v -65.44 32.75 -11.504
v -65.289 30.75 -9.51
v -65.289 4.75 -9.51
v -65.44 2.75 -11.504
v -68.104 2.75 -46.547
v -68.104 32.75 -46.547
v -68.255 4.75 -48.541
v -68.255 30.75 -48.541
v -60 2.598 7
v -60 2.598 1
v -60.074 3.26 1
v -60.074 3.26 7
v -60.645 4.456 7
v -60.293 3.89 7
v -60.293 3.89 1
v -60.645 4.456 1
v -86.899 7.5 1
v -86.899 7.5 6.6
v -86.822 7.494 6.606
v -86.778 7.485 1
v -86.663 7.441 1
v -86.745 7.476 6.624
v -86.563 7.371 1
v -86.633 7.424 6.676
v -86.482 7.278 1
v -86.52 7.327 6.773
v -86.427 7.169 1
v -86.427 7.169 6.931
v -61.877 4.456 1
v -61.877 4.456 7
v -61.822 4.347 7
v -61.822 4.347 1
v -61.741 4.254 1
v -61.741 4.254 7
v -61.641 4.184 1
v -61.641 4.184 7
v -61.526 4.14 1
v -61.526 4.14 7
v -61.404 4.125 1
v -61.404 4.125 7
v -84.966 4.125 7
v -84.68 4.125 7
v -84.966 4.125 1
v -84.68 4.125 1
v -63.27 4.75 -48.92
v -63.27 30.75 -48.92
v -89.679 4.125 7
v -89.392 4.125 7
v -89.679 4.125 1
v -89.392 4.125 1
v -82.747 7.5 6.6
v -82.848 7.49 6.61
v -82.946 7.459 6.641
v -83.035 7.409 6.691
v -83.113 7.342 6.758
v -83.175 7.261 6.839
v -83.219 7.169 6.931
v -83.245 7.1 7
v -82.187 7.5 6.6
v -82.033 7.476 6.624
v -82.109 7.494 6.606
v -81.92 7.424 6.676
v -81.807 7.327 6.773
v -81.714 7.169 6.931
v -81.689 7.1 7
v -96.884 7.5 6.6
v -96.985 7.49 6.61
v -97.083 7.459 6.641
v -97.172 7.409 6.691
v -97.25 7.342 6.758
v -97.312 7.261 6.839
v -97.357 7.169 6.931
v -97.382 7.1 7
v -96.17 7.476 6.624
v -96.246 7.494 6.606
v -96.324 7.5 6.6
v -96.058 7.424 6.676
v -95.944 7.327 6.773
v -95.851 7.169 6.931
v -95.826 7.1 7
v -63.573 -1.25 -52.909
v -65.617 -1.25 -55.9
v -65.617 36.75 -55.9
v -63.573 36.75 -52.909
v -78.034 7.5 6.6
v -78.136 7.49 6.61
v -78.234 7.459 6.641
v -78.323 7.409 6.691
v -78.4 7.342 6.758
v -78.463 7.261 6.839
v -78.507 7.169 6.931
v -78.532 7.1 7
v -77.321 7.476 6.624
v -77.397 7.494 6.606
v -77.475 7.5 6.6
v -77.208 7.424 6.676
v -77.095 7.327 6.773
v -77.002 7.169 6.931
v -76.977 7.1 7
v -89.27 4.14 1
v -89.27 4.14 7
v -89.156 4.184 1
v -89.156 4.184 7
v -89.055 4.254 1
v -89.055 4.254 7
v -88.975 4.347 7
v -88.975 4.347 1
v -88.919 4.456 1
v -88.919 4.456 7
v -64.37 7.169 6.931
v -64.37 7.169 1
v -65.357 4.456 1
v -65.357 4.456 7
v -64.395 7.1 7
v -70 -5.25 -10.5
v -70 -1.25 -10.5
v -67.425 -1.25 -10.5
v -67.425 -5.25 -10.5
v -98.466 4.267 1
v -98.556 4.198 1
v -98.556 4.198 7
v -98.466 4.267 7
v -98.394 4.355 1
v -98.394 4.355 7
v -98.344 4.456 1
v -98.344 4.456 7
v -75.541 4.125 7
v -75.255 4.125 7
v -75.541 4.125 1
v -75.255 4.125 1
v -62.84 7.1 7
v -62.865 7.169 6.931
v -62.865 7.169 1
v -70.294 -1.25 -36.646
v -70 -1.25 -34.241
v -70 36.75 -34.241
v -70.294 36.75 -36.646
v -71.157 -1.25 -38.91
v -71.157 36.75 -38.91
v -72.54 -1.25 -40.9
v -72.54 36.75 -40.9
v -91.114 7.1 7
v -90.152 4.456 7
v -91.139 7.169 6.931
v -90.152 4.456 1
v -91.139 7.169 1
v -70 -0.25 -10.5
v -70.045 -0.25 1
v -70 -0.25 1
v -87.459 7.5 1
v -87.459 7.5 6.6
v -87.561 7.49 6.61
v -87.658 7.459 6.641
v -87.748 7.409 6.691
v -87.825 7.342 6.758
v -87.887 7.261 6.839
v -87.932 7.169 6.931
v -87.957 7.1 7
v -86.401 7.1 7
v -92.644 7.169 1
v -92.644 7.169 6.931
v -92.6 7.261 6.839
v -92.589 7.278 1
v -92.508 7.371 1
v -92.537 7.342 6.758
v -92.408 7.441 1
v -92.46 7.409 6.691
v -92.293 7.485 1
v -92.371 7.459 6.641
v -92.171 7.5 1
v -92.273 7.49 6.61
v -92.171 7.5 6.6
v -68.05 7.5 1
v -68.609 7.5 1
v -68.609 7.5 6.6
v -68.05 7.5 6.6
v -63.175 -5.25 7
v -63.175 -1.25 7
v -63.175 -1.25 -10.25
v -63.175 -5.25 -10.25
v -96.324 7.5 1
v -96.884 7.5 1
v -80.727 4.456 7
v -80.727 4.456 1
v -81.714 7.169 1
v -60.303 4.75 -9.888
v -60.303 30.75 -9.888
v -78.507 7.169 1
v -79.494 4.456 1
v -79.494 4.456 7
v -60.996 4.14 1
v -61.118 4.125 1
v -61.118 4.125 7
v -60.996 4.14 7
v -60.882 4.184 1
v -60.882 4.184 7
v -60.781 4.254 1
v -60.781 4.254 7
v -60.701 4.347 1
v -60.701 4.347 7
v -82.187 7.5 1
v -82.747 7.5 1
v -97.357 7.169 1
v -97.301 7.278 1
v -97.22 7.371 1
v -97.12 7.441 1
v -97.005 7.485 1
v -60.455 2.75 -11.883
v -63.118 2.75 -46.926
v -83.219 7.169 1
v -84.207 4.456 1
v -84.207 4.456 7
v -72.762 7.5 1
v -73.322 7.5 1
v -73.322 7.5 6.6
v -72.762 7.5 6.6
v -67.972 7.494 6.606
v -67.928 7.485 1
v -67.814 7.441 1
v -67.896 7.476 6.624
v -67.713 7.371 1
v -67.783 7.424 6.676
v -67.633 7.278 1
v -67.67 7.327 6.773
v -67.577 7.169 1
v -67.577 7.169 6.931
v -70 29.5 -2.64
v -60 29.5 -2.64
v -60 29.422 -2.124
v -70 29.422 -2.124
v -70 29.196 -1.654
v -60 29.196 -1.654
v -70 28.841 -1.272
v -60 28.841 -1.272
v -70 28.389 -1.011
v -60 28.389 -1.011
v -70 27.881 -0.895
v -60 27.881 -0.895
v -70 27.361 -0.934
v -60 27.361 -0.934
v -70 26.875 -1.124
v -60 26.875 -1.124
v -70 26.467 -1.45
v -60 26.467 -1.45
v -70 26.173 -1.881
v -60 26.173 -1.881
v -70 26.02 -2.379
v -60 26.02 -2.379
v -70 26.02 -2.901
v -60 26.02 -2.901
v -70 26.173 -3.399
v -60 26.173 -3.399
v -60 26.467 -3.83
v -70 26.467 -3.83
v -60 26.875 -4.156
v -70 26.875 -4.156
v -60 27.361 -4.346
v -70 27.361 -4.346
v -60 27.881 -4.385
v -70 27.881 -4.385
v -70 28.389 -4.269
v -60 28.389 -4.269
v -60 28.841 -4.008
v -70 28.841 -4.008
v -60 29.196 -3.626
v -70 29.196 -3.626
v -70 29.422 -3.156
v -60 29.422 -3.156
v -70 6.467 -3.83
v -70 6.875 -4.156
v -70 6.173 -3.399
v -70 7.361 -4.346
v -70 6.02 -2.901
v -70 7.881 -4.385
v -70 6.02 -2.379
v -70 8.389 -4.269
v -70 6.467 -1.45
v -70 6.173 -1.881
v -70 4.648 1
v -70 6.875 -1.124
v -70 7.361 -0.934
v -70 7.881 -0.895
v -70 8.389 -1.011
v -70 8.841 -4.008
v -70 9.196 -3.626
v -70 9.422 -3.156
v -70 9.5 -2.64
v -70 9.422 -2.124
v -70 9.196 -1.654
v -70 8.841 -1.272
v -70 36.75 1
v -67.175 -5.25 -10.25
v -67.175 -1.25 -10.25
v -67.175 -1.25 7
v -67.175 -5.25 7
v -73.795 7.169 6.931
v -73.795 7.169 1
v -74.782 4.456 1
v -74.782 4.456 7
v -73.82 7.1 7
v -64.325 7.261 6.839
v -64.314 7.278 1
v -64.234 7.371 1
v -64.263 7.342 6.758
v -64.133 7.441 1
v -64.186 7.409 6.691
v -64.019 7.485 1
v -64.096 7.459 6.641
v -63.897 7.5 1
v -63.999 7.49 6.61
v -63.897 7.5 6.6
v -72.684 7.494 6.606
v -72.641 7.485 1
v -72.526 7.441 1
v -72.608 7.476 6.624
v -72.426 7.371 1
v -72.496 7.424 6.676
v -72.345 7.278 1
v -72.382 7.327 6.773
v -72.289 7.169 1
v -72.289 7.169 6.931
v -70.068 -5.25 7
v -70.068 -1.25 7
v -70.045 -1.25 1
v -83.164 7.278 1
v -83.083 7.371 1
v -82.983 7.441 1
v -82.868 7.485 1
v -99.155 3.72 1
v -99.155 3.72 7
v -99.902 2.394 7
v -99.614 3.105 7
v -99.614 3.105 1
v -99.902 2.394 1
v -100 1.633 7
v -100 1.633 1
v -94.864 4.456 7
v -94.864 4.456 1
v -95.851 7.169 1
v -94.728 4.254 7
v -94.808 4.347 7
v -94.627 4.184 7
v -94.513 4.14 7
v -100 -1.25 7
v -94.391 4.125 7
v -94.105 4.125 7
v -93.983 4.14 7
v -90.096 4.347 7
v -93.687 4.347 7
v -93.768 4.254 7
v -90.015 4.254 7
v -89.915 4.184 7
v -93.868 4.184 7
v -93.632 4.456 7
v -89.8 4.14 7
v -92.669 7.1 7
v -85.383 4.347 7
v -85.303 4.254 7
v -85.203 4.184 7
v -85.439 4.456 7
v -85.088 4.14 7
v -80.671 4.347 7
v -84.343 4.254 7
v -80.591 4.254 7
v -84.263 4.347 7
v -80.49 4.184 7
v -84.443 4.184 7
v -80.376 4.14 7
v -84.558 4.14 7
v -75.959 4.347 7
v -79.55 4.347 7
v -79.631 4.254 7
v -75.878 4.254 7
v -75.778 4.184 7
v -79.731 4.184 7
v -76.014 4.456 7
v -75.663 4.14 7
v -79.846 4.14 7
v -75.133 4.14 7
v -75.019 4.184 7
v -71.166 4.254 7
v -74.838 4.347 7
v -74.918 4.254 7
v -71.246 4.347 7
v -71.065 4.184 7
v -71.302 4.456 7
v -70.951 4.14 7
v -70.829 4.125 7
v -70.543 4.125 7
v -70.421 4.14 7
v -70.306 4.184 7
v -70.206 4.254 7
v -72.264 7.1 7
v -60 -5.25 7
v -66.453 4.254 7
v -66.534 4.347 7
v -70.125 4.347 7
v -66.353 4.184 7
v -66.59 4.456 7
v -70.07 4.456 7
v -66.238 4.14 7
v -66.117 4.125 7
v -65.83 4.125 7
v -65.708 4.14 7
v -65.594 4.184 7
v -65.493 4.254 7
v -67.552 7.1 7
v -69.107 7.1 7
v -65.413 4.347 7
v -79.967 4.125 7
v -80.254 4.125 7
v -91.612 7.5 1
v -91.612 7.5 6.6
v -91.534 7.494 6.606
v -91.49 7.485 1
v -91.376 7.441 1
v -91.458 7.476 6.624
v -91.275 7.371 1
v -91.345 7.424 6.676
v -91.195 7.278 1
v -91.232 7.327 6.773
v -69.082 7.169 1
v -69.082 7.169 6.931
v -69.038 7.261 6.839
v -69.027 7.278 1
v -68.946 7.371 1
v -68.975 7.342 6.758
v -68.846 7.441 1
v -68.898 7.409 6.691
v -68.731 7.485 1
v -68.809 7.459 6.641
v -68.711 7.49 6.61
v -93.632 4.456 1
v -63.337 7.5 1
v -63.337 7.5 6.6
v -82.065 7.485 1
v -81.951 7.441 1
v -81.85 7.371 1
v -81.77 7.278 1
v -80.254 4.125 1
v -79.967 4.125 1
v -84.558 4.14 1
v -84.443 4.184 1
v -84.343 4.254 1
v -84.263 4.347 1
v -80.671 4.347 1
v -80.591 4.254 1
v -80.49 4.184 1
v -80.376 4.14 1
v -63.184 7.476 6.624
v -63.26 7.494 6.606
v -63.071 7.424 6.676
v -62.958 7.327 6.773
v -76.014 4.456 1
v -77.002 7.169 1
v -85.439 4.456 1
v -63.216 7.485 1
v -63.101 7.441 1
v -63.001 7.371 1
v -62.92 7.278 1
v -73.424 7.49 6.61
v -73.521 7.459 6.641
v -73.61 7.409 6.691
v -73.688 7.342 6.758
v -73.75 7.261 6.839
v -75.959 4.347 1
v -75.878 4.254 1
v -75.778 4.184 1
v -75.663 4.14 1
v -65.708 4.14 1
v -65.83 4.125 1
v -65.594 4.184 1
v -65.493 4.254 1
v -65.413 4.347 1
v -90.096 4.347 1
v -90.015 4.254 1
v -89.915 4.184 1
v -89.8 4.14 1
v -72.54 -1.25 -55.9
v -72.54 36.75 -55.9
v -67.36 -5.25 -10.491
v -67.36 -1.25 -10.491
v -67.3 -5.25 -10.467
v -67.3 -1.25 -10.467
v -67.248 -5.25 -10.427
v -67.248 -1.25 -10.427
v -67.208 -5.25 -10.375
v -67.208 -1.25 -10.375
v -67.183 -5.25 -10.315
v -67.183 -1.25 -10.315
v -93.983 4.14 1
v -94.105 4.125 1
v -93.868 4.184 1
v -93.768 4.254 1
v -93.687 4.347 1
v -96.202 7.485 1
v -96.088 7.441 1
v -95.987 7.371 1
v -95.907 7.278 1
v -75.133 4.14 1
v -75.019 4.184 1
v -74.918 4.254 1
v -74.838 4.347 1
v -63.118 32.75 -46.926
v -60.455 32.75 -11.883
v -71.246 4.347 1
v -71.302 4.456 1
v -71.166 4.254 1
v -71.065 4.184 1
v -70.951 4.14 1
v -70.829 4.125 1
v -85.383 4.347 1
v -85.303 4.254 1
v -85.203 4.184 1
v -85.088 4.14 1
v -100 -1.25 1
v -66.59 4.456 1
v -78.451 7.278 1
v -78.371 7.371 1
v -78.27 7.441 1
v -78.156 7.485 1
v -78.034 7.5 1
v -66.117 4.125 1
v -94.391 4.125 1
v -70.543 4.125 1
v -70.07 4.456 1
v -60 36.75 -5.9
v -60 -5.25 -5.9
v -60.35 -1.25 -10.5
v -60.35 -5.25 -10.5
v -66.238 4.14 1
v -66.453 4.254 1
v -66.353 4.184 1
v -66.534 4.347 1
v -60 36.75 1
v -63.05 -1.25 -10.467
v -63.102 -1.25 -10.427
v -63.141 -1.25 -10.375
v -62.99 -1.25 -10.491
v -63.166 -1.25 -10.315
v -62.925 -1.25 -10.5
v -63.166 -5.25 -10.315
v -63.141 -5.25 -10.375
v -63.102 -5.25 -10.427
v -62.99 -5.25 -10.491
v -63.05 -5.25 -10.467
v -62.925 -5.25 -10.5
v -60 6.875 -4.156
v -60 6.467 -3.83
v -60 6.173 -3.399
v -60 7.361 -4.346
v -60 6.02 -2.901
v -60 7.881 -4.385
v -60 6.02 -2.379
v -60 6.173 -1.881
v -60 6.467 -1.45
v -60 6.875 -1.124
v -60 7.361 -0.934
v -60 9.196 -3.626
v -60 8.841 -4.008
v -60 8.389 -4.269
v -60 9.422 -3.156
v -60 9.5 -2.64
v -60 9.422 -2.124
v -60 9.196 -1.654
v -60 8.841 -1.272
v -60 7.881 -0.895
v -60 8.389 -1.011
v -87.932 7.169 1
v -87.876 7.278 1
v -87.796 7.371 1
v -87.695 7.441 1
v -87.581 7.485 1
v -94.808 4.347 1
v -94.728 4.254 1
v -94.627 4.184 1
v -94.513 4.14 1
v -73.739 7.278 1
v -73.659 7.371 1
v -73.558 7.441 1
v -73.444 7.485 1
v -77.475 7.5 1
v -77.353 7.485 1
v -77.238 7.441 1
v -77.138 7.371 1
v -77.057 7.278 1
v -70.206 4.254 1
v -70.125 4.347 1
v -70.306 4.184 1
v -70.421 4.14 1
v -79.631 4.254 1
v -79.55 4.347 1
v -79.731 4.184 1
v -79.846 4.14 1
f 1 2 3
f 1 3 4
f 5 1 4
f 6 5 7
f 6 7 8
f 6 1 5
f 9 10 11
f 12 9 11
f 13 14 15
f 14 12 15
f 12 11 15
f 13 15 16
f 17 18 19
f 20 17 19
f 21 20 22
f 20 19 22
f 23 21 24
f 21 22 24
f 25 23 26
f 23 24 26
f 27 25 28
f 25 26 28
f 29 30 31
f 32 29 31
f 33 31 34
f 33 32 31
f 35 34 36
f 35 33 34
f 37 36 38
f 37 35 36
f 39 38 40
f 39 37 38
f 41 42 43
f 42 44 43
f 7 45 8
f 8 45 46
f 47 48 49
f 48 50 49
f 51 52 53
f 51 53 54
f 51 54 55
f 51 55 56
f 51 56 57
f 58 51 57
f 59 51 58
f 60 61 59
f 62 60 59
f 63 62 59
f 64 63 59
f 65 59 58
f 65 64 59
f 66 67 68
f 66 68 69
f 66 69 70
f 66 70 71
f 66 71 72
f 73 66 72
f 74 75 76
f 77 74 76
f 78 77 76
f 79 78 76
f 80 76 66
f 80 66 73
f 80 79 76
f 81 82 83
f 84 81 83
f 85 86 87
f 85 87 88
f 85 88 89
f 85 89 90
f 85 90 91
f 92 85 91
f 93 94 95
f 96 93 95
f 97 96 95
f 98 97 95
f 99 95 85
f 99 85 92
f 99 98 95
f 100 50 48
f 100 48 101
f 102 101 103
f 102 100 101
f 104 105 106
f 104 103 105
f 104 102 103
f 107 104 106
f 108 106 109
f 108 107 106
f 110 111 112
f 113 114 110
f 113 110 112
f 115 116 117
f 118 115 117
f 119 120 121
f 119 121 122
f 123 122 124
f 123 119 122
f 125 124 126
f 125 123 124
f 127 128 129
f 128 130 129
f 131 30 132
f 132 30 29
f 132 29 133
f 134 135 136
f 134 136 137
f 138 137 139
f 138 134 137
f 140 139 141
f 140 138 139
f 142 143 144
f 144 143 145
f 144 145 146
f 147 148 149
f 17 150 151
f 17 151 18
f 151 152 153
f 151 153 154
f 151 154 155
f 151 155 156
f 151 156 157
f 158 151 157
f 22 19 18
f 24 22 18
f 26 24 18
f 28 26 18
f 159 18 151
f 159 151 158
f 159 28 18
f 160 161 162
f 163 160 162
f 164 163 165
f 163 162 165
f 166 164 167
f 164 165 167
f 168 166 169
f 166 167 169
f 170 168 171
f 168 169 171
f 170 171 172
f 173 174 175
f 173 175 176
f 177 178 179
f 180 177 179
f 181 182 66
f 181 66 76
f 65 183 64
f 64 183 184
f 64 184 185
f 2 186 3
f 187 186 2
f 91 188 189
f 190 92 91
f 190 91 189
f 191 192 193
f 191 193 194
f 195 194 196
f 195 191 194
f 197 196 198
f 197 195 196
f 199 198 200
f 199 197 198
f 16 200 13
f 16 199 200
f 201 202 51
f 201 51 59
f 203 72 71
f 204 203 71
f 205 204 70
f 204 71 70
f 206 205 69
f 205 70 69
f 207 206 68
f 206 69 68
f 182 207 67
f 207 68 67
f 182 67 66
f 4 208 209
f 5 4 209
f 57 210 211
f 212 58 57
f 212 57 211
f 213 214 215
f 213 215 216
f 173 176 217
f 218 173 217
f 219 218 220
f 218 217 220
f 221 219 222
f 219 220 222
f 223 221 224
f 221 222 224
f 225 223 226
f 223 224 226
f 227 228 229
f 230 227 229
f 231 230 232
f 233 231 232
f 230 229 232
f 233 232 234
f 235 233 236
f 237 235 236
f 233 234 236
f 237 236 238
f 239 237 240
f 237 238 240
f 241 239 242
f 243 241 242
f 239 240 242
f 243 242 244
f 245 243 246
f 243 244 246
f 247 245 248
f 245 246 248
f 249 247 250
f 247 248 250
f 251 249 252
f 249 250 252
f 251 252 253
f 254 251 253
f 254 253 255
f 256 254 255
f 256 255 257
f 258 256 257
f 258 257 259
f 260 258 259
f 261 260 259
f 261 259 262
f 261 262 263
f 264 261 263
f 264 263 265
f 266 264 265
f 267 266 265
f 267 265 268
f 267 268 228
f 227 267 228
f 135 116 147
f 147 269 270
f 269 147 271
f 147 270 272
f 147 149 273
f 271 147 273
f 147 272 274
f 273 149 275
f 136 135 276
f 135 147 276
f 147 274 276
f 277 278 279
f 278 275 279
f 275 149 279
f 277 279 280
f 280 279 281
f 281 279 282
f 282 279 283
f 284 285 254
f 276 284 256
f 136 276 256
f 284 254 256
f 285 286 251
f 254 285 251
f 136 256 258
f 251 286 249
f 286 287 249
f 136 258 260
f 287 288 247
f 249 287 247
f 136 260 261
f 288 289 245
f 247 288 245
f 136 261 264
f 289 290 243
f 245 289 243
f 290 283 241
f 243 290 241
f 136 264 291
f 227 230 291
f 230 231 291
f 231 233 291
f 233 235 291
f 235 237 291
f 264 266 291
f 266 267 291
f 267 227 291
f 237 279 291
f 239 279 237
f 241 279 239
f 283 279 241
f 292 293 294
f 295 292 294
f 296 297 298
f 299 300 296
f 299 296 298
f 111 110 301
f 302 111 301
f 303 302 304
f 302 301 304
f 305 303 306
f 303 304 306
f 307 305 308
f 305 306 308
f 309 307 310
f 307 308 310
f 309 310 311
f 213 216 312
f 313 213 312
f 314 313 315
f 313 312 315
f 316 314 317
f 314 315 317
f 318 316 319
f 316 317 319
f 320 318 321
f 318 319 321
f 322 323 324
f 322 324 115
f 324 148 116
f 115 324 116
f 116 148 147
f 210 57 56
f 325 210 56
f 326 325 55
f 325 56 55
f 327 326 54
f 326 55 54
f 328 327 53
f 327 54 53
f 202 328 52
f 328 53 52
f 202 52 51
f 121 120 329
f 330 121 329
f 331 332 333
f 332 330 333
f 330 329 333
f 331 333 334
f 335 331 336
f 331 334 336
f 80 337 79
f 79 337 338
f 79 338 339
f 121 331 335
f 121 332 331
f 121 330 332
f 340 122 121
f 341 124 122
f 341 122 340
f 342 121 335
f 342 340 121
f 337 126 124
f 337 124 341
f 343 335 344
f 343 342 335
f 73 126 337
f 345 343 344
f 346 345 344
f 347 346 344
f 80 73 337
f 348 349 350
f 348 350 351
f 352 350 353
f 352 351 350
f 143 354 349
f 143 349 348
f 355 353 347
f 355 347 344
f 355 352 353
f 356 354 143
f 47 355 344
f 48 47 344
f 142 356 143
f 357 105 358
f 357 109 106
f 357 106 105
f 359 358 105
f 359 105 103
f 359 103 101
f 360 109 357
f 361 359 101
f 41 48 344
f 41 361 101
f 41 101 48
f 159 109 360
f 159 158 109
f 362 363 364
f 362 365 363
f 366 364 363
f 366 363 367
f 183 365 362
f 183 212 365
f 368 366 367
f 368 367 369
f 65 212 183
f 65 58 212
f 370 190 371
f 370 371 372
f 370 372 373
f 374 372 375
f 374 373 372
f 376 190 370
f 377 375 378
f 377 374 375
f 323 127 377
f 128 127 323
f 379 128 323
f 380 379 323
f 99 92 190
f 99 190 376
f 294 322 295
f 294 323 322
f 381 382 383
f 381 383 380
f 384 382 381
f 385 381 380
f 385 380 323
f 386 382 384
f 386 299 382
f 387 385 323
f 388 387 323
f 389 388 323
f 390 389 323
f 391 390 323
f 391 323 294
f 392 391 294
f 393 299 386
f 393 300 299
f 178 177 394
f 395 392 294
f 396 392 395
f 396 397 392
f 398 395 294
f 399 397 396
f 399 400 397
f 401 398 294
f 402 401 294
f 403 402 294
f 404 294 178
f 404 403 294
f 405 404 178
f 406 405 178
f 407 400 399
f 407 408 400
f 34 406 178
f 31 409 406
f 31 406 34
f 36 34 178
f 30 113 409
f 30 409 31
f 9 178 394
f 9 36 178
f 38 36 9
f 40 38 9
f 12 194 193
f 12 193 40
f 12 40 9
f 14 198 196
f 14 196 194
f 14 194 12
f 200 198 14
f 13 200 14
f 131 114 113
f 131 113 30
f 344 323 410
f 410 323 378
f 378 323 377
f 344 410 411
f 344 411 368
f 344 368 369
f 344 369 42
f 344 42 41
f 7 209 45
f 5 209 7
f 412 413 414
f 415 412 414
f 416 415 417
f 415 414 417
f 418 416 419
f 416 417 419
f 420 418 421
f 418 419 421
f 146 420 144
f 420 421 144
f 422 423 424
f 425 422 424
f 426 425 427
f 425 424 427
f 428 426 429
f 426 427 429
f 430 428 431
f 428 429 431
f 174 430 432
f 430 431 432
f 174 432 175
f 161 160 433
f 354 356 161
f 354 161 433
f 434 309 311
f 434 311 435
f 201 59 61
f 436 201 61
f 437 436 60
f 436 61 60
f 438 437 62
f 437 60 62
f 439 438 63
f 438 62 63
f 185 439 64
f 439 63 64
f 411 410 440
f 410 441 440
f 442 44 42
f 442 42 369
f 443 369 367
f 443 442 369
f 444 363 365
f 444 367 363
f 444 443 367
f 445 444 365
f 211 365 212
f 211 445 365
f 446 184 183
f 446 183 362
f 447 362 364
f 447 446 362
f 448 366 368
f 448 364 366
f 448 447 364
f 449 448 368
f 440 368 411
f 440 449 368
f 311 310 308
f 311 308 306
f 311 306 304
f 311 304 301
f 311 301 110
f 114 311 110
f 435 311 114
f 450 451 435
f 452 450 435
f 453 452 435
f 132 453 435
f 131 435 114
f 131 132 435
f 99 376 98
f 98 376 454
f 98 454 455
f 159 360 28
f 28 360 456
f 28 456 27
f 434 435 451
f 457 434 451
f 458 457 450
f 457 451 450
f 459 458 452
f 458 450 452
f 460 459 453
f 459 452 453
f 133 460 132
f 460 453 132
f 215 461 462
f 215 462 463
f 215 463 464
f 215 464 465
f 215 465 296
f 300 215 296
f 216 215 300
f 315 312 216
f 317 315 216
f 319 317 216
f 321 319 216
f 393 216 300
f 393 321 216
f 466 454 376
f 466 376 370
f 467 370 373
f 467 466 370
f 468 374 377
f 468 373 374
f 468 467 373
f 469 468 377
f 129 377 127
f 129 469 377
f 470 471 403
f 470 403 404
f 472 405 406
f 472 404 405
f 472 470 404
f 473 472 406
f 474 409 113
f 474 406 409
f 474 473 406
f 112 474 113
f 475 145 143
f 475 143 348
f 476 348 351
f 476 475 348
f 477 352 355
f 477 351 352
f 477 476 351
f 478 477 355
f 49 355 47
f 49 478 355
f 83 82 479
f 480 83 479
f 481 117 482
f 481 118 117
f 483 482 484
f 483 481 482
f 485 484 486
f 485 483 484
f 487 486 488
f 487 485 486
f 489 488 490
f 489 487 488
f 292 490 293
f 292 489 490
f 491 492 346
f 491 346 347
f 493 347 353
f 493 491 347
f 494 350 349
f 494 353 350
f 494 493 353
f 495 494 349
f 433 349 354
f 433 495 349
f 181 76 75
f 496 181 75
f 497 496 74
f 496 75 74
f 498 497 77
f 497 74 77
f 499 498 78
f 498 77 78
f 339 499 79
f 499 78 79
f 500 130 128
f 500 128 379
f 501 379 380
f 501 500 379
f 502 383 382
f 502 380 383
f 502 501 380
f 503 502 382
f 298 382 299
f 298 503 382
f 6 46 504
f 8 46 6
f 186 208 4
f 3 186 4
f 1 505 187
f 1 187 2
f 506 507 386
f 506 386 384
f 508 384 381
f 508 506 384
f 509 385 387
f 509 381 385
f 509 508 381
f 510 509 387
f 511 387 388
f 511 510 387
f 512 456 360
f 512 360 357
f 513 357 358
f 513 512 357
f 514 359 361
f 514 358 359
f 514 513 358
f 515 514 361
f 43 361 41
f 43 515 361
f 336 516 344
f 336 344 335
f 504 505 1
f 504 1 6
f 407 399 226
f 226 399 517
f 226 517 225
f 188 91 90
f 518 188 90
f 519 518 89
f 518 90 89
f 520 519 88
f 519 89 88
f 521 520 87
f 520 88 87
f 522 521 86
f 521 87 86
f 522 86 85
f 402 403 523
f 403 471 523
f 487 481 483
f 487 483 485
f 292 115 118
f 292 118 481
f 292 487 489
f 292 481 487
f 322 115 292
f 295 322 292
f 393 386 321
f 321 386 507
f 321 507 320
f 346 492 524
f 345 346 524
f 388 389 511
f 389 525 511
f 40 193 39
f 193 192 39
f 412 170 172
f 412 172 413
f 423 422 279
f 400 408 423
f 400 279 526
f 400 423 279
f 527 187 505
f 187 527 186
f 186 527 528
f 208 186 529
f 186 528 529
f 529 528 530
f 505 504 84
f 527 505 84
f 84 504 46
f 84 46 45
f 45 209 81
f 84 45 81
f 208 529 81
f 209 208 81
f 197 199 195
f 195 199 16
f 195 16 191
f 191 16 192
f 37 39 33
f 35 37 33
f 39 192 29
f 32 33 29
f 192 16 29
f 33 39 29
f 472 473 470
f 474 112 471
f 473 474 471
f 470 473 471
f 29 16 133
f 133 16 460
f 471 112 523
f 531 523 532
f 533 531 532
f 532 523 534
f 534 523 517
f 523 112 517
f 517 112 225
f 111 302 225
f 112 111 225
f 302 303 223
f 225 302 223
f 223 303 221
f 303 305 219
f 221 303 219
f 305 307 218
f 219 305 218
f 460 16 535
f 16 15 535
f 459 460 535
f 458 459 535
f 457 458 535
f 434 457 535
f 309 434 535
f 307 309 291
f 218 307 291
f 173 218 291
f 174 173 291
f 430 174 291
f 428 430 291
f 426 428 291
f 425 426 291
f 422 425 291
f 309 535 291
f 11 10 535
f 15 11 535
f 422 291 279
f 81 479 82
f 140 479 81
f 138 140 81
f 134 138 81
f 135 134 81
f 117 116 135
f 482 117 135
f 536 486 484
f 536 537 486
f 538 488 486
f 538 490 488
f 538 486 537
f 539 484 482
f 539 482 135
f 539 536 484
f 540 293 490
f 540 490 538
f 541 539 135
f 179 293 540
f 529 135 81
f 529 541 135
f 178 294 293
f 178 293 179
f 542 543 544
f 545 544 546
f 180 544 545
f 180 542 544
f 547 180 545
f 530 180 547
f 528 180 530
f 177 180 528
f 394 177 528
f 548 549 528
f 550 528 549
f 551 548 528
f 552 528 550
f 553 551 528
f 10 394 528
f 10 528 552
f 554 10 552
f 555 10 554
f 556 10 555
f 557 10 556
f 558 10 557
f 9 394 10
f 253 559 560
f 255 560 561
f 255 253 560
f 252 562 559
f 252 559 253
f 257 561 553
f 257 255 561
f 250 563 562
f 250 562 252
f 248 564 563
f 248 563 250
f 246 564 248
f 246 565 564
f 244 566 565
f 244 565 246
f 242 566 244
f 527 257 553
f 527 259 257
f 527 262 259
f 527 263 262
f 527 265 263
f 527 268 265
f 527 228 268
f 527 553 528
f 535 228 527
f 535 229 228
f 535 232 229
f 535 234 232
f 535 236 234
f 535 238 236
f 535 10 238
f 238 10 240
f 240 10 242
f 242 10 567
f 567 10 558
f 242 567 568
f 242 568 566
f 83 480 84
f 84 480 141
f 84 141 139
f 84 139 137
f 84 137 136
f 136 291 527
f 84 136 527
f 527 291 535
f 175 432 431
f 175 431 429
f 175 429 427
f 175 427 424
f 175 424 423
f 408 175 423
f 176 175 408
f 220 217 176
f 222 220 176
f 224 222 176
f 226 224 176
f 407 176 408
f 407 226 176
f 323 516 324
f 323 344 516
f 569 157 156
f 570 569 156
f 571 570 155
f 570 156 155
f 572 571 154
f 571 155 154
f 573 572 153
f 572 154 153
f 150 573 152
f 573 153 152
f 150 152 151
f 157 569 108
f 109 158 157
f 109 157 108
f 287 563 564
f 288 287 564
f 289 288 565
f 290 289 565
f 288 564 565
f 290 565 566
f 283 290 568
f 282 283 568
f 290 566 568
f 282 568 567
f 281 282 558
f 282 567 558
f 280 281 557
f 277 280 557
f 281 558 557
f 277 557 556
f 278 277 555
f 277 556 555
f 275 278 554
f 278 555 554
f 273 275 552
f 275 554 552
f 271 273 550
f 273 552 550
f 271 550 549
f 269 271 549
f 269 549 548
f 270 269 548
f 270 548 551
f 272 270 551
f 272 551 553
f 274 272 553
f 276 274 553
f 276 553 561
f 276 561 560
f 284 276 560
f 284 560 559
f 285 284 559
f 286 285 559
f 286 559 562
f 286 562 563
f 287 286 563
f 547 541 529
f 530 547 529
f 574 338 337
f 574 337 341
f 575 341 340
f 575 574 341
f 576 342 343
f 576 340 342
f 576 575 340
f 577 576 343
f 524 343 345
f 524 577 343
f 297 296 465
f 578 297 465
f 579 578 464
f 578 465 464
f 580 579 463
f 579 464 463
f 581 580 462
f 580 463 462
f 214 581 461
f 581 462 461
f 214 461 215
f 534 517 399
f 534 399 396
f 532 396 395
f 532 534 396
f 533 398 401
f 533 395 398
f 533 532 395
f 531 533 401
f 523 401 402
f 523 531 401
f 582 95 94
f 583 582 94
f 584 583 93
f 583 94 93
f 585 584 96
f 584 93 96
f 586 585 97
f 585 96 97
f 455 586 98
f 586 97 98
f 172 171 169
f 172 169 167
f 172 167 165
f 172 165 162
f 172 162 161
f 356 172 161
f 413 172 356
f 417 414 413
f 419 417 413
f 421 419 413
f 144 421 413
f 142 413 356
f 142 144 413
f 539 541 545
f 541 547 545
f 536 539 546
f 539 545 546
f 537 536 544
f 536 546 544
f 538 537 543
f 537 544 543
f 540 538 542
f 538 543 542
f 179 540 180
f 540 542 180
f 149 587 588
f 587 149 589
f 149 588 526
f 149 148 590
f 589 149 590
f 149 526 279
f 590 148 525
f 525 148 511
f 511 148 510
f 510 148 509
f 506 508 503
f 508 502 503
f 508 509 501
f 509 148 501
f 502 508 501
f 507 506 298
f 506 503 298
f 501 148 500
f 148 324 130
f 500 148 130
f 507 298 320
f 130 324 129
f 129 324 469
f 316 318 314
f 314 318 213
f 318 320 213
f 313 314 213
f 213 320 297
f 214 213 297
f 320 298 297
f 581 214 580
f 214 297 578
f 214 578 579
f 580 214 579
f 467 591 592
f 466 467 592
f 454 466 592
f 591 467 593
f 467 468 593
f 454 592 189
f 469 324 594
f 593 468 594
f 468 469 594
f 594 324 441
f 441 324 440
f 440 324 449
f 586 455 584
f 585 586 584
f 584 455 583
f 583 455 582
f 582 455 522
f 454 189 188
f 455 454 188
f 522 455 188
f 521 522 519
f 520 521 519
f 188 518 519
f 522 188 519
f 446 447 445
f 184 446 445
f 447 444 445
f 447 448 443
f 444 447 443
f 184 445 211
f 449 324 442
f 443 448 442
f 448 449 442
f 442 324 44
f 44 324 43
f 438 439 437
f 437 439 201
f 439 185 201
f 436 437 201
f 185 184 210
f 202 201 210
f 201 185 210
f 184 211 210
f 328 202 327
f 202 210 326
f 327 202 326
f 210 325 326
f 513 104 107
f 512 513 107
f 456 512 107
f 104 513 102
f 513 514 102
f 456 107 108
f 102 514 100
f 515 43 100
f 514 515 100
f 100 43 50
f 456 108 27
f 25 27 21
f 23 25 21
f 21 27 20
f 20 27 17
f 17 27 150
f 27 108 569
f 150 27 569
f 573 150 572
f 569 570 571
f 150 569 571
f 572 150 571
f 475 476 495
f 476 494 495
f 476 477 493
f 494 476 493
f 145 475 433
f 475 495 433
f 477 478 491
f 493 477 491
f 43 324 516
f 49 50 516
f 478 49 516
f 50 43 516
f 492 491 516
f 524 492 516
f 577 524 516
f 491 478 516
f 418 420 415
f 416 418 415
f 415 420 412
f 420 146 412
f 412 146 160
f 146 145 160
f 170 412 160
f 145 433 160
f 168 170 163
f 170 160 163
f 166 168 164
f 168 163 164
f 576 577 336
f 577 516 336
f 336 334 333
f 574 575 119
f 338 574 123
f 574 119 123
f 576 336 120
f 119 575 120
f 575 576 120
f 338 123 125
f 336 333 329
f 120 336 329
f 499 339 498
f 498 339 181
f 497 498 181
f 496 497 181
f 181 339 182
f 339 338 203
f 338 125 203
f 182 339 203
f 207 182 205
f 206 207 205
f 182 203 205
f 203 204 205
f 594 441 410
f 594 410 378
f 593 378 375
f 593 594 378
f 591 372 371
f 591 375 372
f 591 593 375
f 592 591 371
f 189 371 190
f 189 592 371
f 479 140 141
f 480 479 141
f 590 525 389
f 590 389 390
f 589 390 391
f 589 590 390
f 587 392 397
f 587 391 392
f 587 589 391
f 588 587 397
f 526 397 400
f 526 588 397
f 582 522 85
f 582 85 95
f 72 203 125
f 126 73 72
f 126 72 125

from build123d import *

# Parameters (mm, degrees)
BOSS_EXTRUDE1_DEPTH      = 7.5
BOSS_EXTRUDE1_DEPTH_BACK = 7.5
SKETCH3_W                = 200
SKETCH3_H                = 15
CUT_EXTRUDE1_DEPTH       = 101.560926806
FILLET1_R                = 0.503257554
LPATTERN1_COUNT          = 42
LPATTERN1_PITCH          = 4.71238898
FILLET1_OF_LPATTERN1_R   = 0.503257554
CUT_EXTRUDE2_DEPTH       = 101.560926806
CUT_EXTRUDE2_DEPTH_BACK  = 101.560926806
SKETCH5_W                = 4.71238898
SKETCH5_H                = 3.375
CUT_EXTRUDE3_DEPTH       = 101.560926806
CUT_EXTRUDE3_DEPTH_BACK  = 101.560926806
SKETCH6_W                = 13.890612777
SKETCH6_H                = 21.950597968
CUT_EXTRUDE6_DEPTH       = 101.560926806
CUT_EXTRUDE6_DEPTH_BACK  = 101.560926806
SKETCH8_W                = 175.100830171
SKETCH8_H                = 44.946806771
SKETCH9_W                = 55.501850732
SKETCH9_H                = 10.784038355
CUT_EXTRUDE7_DEPTH       = 101.560926806
SKETCH10_W               = 10
SKETCH10_H               = 38
BOSS_EXTRUDE2_DEPTH      = 6.9
SKETCH11_W               = 12.54
SKETCH11_H               = 38
BOSS_EXTRUDE3_DEPTH      = 50
SKETCH12_W               = 2.54
SKETCH12_H               = 35
CUT_EXTRUDE8_DEPTH       = 121.701325593
CHAMFER1_SIZE            = 3
CHAMFER1_SIZE2           = 1.816762814
FILLET2_R                = 10
SKETCH13_W               = 39.144192087
SKETCH13_H               = 30
CUT_EXTRUDE9_DEPTH       = 5
CHAMFER2_SIZE            = 2
SKETCH14_R               = 1.75
CUT_EXTRUDE10_DEPTH      = 78.944675893
BOSS_EXTRUDE4_DEPTH      = 4
BOSS_EXTRUDE4_DEPTH_BACK = 1
FILLET3_R                = 0.25
SKETCH16_W               = 73.039939744
SKETCH16_H               = 56.96380351
CUT_EXTRUDE11_DEPTH      = 0.5
FILLET5_R                = 3
CUT_EXTRUDE12_DEPTH      = 78.944675893
CUT_EXTRUDE12_DEPTH_BACK = 78.944675893


with BuildPart() as part:
    # Sketch3 → Boss-Extrude1 (new, two sides: drawn at the far end of the back side and taken through both)
    with BuildSketch(Plane.XY.offset(-BOSS_EXTRUDE1_DEPTH_BACK)):
        Rectangle(SKETCH3_W, SKETCH3_H)
    extrude(amount=BOSS_EXTRUDE1_DEPTH + BOSS_EXTRUDE1_DEPTH_BACK)

    # Sketch4 → Cut-Extrude1 (cut, symmetric)
    with BuildSketch(Plane.XY):
        Polygon((-94.247779608, 7.5), (-94.247779608, 4.125), (-94.743432664, 4.125), (-95.971832204, 7.5), align=None)
        Polygon((-97.236115992, 7.5), (-98.464515532, 4.125), (-98.960168588, 4.125), (-98.960168588, 7.5), align=None)
    cut_extrude1 = extrude(amount=CUT_EXTRUDE1_DEPTH, both=True, mode=Mode.SUBTRACT)

    # Fillet1
    fillet1_edges = [part.edges().sort_by_distance(p)[0] for p in [
        (-95.971832204, 7.5, 0),
        (-94.743432664, 4.125, 0),
        (-97.236115992, 7.5, 0),
        (-98.464515532, 4.125, 0),
    ]]
    fillet(fillet1_edges, radius=FILLET1_R)

    # LPattern1: Cut-Extrude1 ×42
    with Locations(*[(i * LPATTERN1_PITCH, 0, 0) for i in range(1, LPATTERN1_COUNT)]):
        add(cut_extrude1, mode=Mode.SUBTRACT)

    # Fillet1 of LPattern1
    fillet1_of_lpattern1_edges = [part.edges().sort_by_distance(p)[0] for p in [
        (-91.259443224, 7.5, 0),
        (-90.031043683, 4.125, 0),
        (-92.523727011, 7.5, 0),
        (-93.752126552, 4.125, 0),
        (-86.547054243, 7.5, 0),
        (-85.318654703, 4.125, 0),
        (-87.811338031, 7.5, 0),
        (-89.039737571, 4.125, 0),
        (-81.834665263, 7.5, 0),
        (-80.606265722, 4.125, 0),
        (-83.09894905, 7.5, 0),
        (-84.327348591, 4.125, 0),
        (-77.122276283, 7.5, 0),
        (-75.893876742, 4.125, 0),
        (-78.38656007, 7.5, 0),
        (-79.614959611, 4.125, 0),
        (-72.409887302, 7.5, 0),
        (-71.181487762, 4.125, 0),
        (-73.67417109, 7.5, 0),
        (-74.90257063, 4.125, 0),
        (-67.697498322, 7.5, 0),
        (-66.469098781, 4.125, 0),
        (-68.961782109, 7.5, 0),
        (-70.19018165, 4.125, 0),
        (-62.985109342, 7.5, 0),
        (-61.756709801, 4.125, 0),
        (-64.249393129, 7.5, 0),
        (-65.47779267, 4.125, 0),
        (-58.272720361, 7.5, 0),
        (-57.04432082, 4.125, 0),
        (-59.537004149, 7.5, 0),
        (-60.765403689, 4.125, 0),
        (-53.560331381, 7.5, 0),
        (-52.33193184, 4.125, 0),
        (-54.824615168, 7.5, 0),
        (-56.053014709, 4.125, 0),
        (-48.8479424, 7.5, 0),
        (-47.61954286, 4.125, 0),
        (-50.112226188, 7.5, 0),
        (-51.340625728, 4.125, 0),
        (-44.13555342, 7.5, 0),
        (-42.907153879, 4.125, 0),
        (-45.399837207, 7.5, 0),
        (-46.628236748, 4.125, 0),
        (-39.42316444, 7.5, 0),
        (-38.194764899, 4.125, 0),
        (-40.687448227, 7.5, 0),
        (-41.915847768, 4.125, 0),
        (-34.710775459, 7.5, 0),
        (-33.482375919, 4.125, 0),
        (-35.975059247, 7.5, 0),
        (-37.203458787, 4.125, 0),
        (-29.998386479, 7.5, 0),
        (-28.769986938, 4.125, 0),
        (-31.262670266, 7.5, 0),
        (-32.491069807, 4.125, 0),
        (-25.285997498, 7.5, 0),
        (-24.057597958, 4.125, 0),
        (-26.550281286, 7.5, 0),
        (-27.778680826, 4.125, 0),
        (-20.573608518, 7.5, 0),
        (-19.345208977, 4.125, 0),
        (-21.837892305, 7.5, 0),
        (-23.066291846, 4.125, 0),
        (-15.861219538, 7.5, 0),
        (-14.632819997, 4.125, 0),
        (-17.125503325, 7.5, 0),
        (-18.353902866, 4.125, 0),
        (-11.148830557, 7.5, 0),
        (-9.920431017, 4.125, 0),
        (-12.413114345, 7.5, 0),
        (-13.641513885, 4.125, 0),
        (-6.436441577, 7.5, 0),
        (-5.208042036, 4.125, 0),
        (-7.700725364, 7.5, 0),
        (-8.929124905, 4.125, 0),
        (-1.724052597, 7.5, 0),
        (-0.495653056, 4.125, 0),
        (-2.988336384, 7.5, 0),
        (-4.216735925, 4.125, 0),
        (2.988336384, 7.5, 0),
        (4.216735925, 4.125, 0),
        (1.724052596, 7.5, 0),
        (0.495653056, 4.125, 0),
        (7.700725364, 7.5, 0),
        (8.929124905, 4.125, 0),
        (6.436441577, 7.5, 0),
        (5.208042036, 4.125, 0),
        (12.413114345, 7.5, 0),
        (13.641513885, 4.125, 0),
        (11.148830557, 7.5, 0),
        (9.920431017, 4.125, 0),
        (17.125503325, 7.5, 0),
        (18.353902866, 4.125, 0),
        (15.861219538, 7.5, 0),
        (14.632819997, 4.125, 0),
        (21.837892305, 7.5, 0),
        (23.066291846, 4.125, 0),
        (20.573608518, 7.5, 0),
        (19.345208977, 4.125, 0),
        (26.550281286, 7.5, 0),
        (27.778680826, 4.125, 0),
        (25.285997498, 7.5, 0),
        (24.057597958, 4.125, 0),
        (31.262670266, 7.5, 0),
        (32.491069807, 4.125, 0),
        (29.998386479, 7.5, 0),
        (28.769986938, 4.125, 0),
        (35.975059247, 7.5, 0),
        (37.203458787, 4.125, 0),
        (34.710775459, 7.5, 0),
        (33.482375919, 4.125, 0),
        (40.687448227, 7.5, 0),
        (41.915847768, 4.125, 0),
        (39.42316444, 7.5, 0),
        (38.194764899, 4.125, 0),
        (45.399837207, 7.5, 0),
        (46.628236748, 4.125, 0),
        (44.13555342, 7.5, 0),
        (42.907153879, 4.125, 0),
        (50.112226188, 7.5, 0),
        (51.340625728, 4.125, 0),
        (48.8479424, 7.5, 0),
        (47.61954286, 4.125, 0),
        (54.824615168, 7.5, 0),
        (56.053014709, 4.125, 0),
        (53.560331381, 7.5, 0),
        (52.33193184, 4.125, 0),
        (59.537004148, 7.5, 0),
        (60.765403689, 4.125, 0),
        (58.272720361, 7.5, 0),
        (57.04432082, 4.125, 0),
        (64.249393129, 7.5, 0),
        (65.47779267, 4.125, 0),
        (62.985109341, 7.5, 0),
        (61.756709801, 4.125, 0),
        (68.961782109, 7.5, 0),
        (70.19018165, 4.125, 0),
        (67.697498322, 7.5, 0),
        (66.469098781, 4.125, 0),
        (73.67417109, 7.5, 0),
        (74.90257063, 4.125, 0),
        (72.409887302, 7.5, 0),
        (71.181487762, 4.125, 0),
        (78.38656007, 7.5, 0),
        (79.614959611, 4.125, 0),
        (77.122276283, 7.5, 0),
        (75.893876742, 4.125, 0),
        (83.09894905, 7.5, 0),
        (84.327348591, 4.125, 0),
        (81.834665263, 7.5, 0),
        (80.606265722, 4.125, 0),
        (87.811338031, 7.5, 0),
        (89.039737571, 4.125, 0),
        (86.547054243, 7.5, 0),
        (85.318654703, 4.125, 0),
        (92.523727011, 7.5, 0),
        (93.752126552, 4.125, 0),
        (91.259443224, 7.5, 0),
        (90.031043683, 4.125, 0),
        (97.236115992, 7.5, 0),
        (98.464515532, 4.125, 0),
        (95.971832204, 7.5, 0),
        (94.743432664, 4.125, 0),
    ]]
    fillet(fillet1_of_lpattern1_edges, radius=FILLET1_OF_LPATTERN1_R)

    # Sketch5 → Cut-Extrude2 (cut, two sides: drawn at the far end of the back side and taken through both)
    with BuildSketch(Plane.XY.offset(-CUT_EXTRUDE2_DEPTH_BACK)):
        with Locations((-101.316363078, 5.8125)):
            Rectangle(SKETCH5_W, SKETCH5_H)
        with Locations((101.316363078, 5.8125)):
            Rectangle(SKETCH5_W, SKETCH5_H)
    extrude(amount=CUT_EXTRUDE2_DEPTH + CUT_EXTRUDE2_DEPTH_BACK, mode=Mode.SUBTRACT)

    # Sketch6 → Cut-Extrude3 (cut, two sides: drawn at the far end of the back side and taken through both)
    with BuildSketch(Plane(origin=(0, 0, 0), x_dir=(0, 0, -1), z_dir=(1, 0, 0)).offset(-CUT_EXTRUDE3_DEPTH_BACK)):
        with Locations((5.945306389, -0.750264579)):
            Rectangle(SKETCH6_W, SKETCH6_H)
    extrude(amount=CUT_EXTRUDE3_DEPTH + CUT_EXTRUDE3_DEPTH_BACK, mode=Mode.SUBTRACT)

    # Sketch8 → Cut-Extrude6 (cut, two sides: drawn at the far end of the back side and taken through both)
    with BuildSketch(Plane.XY.offset(-CUT_EXTRUDE6_DEPTH_BACK)):
        with Locations((27.550415086, 7.242613414)):
            Rectangle(SKETCH8_W, SKETCH8_H)
    extrude(amount=CUT_EXTRUDE6_DEPTH + CUT_EXTRUDE6_DEPTH_BACK, mode=Mode.SUBTRACT)

    # Sketch9 → Cut-Extrude7 (cut, through all)
    with BuildSketch(Plane.XY):
        with Locations((-76.828993169, -6.642019178)):
            Rectangle(SKETCH9_W, SKETCH9_H)
    extrude(amount=CUT_EXTRUDE7_DEPTH, mode=Mode.SUBTRACT)

    # Sketch10 → Boss-Extrude2 (add)
    with BuildSketch(Plane(origin=(0, 0, 1), x_dir=(-1, 0, 0), z_dir=(0, 0, -1))):
        with Locations((65, 17.75)):
            Rectangle(SKETCH10_W, SKETCH10_H)
    extrude(amount=BOSS_EXTRUDE2_DEPTH)

    # Sketch11 → Boss-Extrude3 (add)
    with BuildSketch(Plane(origin=(0, 0, -5.9), x_dir=(-1, 0, 0), z_dir=(0, 0, -1))):
        with Locations((66.27, 17.75)):
            Rectangle(SKETCH11_W, SKETCH11_H)
    extrude(amount=BOSS_EXTRUDE3_DEPTH)

    # Sketch12 → Cut-Extrude8 (cut, through all)
    with BuildSketch(Plane.XZ.offset(1.25)):
        with Locations((-71.27, -23.4)):
            Rectangle(SKETCH12_W, SKETCH12_H)
        Polygon((-60, -5.9), (-63.8, -55.9), (-60, -55.9), align=None)
    extrude(amount=-CUT_EXTRUDE8_DEPTH, mode=Mode.SUBTRACT)

    # Chamfer1
    chamfer1_edges = [part.edges().sort_by_distance(p)[0] for p in [
        (-63.8, 17.75, -55.9),
    ]]
    chamfer1_side = [part.faces().sort_by_distance(p)[0] for p in [
        (-61.9, 17.75, -30.9),
    ]]
    chamfer(chamfer1_edges, length=CHAMFER1_SIZE, length2=CHAMFER1_SIZE2, reference=chamfer1_side[0])

    # Fillet2
    # the kernel refuses this fillet: 10 mm, written as the material it adds along each edge
    with BuildSketch(Plane(origin=(-70, -1.25, -40.9), x_dir=(-1, 0, 0), z_dir=(0, 1, 0))) as fillet2_piece_1:
        with BuildLine():
            CenterArc((10, 6.659459438), FILLET2_R, 180, 41.754936598)
            Line((0, 6.659459438), (-0.2, 6.659459438))
            Line((-0.2, 6.659459438), (-0.2, 0))
            Line((-0.2, 0), (0, -0.2))
            ThreePointArc((0, -0.2), (1.27, -0.2), (2.3908, -0.133189189))
            Line((2.3908, -0.133189189), (2.54, 0))
        make_face()
    extrude(amount=38)

    # Sketch13 → Cut-Extrude9 (cut)
    with BuildSketch(Plane(origin=(-59.20960532, 0, 4.499930004), x_dir=(-0.07578145826840343, 0, -0.997124450900044), z_dir=(0.997124450900044, 0, -0.07578145826840343))):
        with Locations((34.0020178, 17.75)):
            Rectangle(SKETCH13_W, SKETCH13_H)
    extrude(amount=-CUT_EXTRUDE9_DEPTH, mode=Mode.SUBTRACT)

    # Chamfer2
    chamfer2_edges = [part.edges().sort_by_distance(p)[0] for p in [
        (-62.79593696, 2.75, -9.699044158),
        (-62.79593696, 32.75, -9.699044158),
        (-65.762340919, 32.75, -48.730675198),
        (-65.762340919, 2.75, -48.730675198),
    ]]
    chamfer(chamfer2_edges, length=CHAMFER2_SIZE)

    # Sketch14 → Cut-Extrude10 (cut, through all)
    with BuildSketch(Plane(origin=(-60, 0, 0), x_dir=(0, 0, -1), z_dir=(1, 0, 0))):
        with Locations(Location((2.64, 27.75, 0), (0, 0, 90))):
            Circle(SKETCH14_R)
        with Locations(Location((2.64, 7.75, 0), (0, 0, 90))):
            Circle(SKETCH14_R)
    extrude(amount=-CUT_EXTRUDE10_DEPTH, mode=Mode.SUBTRACT)

    # Sketch15 → Boss-Extrude4 (add, two sides: drawn at the far end of the back side and taken through both)
    with BuildSketch(Plane.XZ.offset(1.25).offset(-BOSS_EXTRUDE4_DEPTH_BACK)):
        Polygon((-70.069658973, 7.5), (-70, -10.5), (-67.1748, -10.5), (-67.1748, 7.5), align=None)
        Polygon((-60, -5.9), (-60, 7.5), (-63.1748, 7.5), (-63.1748, -10.5), (-60.3496, -10.5), align=None)
    extrude(amount=BOSS_EXTRUDE4_DEPTH + BOSS_EXTRUDE4_DEPTH_BACK)

    # Fillet3
    fillet3_edges = [part.edges().sort_by_distance(p)[0] for p in [
        (-67.1748, -3.25, 7.5),
        (-67.1748, -3.25, -10.5),
        (-63.1748, -3.25, -10.5),
        (-63.1748, -3.25, 7.5),
    ]]
    fillet(fillet3_edges, radius=FILLET3_R)

    # Sketch16 → Cut-Extrude11 (cut)
    with BuildSketch(Plane.XY.offset(7.5)):
        with Locations((-72.750010193, 7.574608655)):
            Rectangle(SKETCH16_W, SKETCH16_H)
    extrude(amount=-CUT_EXTRUDE11_DEPTH, mode=Mode.SUBTRACT)

    # Fillet5
    # the kernel refuses this fillet: 3 mm, written as the material it takes off along each edge
    with BuildSketch(Plane(origin=(-100, 4.125, -5.230049704), x_dir=(0.9987257002687598, 0.05046757000961256, 0), z_dir=(0, 0, 1))) as fillet5_piece_1:
        with BuildLine():
            CenterArc((2.870410913, -2.640247011), FILLET5_R, 118.347702704, 58.759489659)
            Line((-0.125766188, -2.488844301), (-0.425383898, -2.47370403))
            Line((-0.425383898, -2.47370403), (-0.29961771, 0.015140271))
            Line((-0.29961771, 0.015140271), (0.015140271, 0.29961771))
            ThreePointArc((0.015140271, 0.29961771), (1.196732382, 0.239909541), (1.303501273, 0.264024701))
            Line((1.303501273, 0.264024701), (1.445947604, 0))
        make_face()
    extrude(amount=18.460099408, mode=Mode.SUBTRACT)
    with BuildSketch(Plane(origin=(-60, 6.227929353, 1), x_dir=(0, -1, 0), z_dir=(0, 0, 1))) as fillet5_piece_2:
        with BuildLine():
            CenterArc((3.630132521, -3), FILLET5_R, 90, 38.275653288)
            Line((1.77179602, -0.644881012), (0, 0))
            Line((0, 0), (3.630132521, 0))
        make_face()
    extrude(amount=15.075331304, mode=Mode.SUBTRACT)

    # Sketch17 → Cut-Extrude12 (cut, two sides: drawn at the far end of the back side and taken through both)
    with BuildSketch(Plane.ZY.offset(100).offset(-CUT_EXTRUDE12_DEPTH_BACK)):
        Polygon((6.6, 7.5), (7, 7.1), (7, 7.5), align=None)
    extrude(amount=CUT_EXTRUDE12_DEPTH + CUT_EXTRUDE12_DEPTH_BACK, mode=Mode.SUBTRACT)


solid = part.part
